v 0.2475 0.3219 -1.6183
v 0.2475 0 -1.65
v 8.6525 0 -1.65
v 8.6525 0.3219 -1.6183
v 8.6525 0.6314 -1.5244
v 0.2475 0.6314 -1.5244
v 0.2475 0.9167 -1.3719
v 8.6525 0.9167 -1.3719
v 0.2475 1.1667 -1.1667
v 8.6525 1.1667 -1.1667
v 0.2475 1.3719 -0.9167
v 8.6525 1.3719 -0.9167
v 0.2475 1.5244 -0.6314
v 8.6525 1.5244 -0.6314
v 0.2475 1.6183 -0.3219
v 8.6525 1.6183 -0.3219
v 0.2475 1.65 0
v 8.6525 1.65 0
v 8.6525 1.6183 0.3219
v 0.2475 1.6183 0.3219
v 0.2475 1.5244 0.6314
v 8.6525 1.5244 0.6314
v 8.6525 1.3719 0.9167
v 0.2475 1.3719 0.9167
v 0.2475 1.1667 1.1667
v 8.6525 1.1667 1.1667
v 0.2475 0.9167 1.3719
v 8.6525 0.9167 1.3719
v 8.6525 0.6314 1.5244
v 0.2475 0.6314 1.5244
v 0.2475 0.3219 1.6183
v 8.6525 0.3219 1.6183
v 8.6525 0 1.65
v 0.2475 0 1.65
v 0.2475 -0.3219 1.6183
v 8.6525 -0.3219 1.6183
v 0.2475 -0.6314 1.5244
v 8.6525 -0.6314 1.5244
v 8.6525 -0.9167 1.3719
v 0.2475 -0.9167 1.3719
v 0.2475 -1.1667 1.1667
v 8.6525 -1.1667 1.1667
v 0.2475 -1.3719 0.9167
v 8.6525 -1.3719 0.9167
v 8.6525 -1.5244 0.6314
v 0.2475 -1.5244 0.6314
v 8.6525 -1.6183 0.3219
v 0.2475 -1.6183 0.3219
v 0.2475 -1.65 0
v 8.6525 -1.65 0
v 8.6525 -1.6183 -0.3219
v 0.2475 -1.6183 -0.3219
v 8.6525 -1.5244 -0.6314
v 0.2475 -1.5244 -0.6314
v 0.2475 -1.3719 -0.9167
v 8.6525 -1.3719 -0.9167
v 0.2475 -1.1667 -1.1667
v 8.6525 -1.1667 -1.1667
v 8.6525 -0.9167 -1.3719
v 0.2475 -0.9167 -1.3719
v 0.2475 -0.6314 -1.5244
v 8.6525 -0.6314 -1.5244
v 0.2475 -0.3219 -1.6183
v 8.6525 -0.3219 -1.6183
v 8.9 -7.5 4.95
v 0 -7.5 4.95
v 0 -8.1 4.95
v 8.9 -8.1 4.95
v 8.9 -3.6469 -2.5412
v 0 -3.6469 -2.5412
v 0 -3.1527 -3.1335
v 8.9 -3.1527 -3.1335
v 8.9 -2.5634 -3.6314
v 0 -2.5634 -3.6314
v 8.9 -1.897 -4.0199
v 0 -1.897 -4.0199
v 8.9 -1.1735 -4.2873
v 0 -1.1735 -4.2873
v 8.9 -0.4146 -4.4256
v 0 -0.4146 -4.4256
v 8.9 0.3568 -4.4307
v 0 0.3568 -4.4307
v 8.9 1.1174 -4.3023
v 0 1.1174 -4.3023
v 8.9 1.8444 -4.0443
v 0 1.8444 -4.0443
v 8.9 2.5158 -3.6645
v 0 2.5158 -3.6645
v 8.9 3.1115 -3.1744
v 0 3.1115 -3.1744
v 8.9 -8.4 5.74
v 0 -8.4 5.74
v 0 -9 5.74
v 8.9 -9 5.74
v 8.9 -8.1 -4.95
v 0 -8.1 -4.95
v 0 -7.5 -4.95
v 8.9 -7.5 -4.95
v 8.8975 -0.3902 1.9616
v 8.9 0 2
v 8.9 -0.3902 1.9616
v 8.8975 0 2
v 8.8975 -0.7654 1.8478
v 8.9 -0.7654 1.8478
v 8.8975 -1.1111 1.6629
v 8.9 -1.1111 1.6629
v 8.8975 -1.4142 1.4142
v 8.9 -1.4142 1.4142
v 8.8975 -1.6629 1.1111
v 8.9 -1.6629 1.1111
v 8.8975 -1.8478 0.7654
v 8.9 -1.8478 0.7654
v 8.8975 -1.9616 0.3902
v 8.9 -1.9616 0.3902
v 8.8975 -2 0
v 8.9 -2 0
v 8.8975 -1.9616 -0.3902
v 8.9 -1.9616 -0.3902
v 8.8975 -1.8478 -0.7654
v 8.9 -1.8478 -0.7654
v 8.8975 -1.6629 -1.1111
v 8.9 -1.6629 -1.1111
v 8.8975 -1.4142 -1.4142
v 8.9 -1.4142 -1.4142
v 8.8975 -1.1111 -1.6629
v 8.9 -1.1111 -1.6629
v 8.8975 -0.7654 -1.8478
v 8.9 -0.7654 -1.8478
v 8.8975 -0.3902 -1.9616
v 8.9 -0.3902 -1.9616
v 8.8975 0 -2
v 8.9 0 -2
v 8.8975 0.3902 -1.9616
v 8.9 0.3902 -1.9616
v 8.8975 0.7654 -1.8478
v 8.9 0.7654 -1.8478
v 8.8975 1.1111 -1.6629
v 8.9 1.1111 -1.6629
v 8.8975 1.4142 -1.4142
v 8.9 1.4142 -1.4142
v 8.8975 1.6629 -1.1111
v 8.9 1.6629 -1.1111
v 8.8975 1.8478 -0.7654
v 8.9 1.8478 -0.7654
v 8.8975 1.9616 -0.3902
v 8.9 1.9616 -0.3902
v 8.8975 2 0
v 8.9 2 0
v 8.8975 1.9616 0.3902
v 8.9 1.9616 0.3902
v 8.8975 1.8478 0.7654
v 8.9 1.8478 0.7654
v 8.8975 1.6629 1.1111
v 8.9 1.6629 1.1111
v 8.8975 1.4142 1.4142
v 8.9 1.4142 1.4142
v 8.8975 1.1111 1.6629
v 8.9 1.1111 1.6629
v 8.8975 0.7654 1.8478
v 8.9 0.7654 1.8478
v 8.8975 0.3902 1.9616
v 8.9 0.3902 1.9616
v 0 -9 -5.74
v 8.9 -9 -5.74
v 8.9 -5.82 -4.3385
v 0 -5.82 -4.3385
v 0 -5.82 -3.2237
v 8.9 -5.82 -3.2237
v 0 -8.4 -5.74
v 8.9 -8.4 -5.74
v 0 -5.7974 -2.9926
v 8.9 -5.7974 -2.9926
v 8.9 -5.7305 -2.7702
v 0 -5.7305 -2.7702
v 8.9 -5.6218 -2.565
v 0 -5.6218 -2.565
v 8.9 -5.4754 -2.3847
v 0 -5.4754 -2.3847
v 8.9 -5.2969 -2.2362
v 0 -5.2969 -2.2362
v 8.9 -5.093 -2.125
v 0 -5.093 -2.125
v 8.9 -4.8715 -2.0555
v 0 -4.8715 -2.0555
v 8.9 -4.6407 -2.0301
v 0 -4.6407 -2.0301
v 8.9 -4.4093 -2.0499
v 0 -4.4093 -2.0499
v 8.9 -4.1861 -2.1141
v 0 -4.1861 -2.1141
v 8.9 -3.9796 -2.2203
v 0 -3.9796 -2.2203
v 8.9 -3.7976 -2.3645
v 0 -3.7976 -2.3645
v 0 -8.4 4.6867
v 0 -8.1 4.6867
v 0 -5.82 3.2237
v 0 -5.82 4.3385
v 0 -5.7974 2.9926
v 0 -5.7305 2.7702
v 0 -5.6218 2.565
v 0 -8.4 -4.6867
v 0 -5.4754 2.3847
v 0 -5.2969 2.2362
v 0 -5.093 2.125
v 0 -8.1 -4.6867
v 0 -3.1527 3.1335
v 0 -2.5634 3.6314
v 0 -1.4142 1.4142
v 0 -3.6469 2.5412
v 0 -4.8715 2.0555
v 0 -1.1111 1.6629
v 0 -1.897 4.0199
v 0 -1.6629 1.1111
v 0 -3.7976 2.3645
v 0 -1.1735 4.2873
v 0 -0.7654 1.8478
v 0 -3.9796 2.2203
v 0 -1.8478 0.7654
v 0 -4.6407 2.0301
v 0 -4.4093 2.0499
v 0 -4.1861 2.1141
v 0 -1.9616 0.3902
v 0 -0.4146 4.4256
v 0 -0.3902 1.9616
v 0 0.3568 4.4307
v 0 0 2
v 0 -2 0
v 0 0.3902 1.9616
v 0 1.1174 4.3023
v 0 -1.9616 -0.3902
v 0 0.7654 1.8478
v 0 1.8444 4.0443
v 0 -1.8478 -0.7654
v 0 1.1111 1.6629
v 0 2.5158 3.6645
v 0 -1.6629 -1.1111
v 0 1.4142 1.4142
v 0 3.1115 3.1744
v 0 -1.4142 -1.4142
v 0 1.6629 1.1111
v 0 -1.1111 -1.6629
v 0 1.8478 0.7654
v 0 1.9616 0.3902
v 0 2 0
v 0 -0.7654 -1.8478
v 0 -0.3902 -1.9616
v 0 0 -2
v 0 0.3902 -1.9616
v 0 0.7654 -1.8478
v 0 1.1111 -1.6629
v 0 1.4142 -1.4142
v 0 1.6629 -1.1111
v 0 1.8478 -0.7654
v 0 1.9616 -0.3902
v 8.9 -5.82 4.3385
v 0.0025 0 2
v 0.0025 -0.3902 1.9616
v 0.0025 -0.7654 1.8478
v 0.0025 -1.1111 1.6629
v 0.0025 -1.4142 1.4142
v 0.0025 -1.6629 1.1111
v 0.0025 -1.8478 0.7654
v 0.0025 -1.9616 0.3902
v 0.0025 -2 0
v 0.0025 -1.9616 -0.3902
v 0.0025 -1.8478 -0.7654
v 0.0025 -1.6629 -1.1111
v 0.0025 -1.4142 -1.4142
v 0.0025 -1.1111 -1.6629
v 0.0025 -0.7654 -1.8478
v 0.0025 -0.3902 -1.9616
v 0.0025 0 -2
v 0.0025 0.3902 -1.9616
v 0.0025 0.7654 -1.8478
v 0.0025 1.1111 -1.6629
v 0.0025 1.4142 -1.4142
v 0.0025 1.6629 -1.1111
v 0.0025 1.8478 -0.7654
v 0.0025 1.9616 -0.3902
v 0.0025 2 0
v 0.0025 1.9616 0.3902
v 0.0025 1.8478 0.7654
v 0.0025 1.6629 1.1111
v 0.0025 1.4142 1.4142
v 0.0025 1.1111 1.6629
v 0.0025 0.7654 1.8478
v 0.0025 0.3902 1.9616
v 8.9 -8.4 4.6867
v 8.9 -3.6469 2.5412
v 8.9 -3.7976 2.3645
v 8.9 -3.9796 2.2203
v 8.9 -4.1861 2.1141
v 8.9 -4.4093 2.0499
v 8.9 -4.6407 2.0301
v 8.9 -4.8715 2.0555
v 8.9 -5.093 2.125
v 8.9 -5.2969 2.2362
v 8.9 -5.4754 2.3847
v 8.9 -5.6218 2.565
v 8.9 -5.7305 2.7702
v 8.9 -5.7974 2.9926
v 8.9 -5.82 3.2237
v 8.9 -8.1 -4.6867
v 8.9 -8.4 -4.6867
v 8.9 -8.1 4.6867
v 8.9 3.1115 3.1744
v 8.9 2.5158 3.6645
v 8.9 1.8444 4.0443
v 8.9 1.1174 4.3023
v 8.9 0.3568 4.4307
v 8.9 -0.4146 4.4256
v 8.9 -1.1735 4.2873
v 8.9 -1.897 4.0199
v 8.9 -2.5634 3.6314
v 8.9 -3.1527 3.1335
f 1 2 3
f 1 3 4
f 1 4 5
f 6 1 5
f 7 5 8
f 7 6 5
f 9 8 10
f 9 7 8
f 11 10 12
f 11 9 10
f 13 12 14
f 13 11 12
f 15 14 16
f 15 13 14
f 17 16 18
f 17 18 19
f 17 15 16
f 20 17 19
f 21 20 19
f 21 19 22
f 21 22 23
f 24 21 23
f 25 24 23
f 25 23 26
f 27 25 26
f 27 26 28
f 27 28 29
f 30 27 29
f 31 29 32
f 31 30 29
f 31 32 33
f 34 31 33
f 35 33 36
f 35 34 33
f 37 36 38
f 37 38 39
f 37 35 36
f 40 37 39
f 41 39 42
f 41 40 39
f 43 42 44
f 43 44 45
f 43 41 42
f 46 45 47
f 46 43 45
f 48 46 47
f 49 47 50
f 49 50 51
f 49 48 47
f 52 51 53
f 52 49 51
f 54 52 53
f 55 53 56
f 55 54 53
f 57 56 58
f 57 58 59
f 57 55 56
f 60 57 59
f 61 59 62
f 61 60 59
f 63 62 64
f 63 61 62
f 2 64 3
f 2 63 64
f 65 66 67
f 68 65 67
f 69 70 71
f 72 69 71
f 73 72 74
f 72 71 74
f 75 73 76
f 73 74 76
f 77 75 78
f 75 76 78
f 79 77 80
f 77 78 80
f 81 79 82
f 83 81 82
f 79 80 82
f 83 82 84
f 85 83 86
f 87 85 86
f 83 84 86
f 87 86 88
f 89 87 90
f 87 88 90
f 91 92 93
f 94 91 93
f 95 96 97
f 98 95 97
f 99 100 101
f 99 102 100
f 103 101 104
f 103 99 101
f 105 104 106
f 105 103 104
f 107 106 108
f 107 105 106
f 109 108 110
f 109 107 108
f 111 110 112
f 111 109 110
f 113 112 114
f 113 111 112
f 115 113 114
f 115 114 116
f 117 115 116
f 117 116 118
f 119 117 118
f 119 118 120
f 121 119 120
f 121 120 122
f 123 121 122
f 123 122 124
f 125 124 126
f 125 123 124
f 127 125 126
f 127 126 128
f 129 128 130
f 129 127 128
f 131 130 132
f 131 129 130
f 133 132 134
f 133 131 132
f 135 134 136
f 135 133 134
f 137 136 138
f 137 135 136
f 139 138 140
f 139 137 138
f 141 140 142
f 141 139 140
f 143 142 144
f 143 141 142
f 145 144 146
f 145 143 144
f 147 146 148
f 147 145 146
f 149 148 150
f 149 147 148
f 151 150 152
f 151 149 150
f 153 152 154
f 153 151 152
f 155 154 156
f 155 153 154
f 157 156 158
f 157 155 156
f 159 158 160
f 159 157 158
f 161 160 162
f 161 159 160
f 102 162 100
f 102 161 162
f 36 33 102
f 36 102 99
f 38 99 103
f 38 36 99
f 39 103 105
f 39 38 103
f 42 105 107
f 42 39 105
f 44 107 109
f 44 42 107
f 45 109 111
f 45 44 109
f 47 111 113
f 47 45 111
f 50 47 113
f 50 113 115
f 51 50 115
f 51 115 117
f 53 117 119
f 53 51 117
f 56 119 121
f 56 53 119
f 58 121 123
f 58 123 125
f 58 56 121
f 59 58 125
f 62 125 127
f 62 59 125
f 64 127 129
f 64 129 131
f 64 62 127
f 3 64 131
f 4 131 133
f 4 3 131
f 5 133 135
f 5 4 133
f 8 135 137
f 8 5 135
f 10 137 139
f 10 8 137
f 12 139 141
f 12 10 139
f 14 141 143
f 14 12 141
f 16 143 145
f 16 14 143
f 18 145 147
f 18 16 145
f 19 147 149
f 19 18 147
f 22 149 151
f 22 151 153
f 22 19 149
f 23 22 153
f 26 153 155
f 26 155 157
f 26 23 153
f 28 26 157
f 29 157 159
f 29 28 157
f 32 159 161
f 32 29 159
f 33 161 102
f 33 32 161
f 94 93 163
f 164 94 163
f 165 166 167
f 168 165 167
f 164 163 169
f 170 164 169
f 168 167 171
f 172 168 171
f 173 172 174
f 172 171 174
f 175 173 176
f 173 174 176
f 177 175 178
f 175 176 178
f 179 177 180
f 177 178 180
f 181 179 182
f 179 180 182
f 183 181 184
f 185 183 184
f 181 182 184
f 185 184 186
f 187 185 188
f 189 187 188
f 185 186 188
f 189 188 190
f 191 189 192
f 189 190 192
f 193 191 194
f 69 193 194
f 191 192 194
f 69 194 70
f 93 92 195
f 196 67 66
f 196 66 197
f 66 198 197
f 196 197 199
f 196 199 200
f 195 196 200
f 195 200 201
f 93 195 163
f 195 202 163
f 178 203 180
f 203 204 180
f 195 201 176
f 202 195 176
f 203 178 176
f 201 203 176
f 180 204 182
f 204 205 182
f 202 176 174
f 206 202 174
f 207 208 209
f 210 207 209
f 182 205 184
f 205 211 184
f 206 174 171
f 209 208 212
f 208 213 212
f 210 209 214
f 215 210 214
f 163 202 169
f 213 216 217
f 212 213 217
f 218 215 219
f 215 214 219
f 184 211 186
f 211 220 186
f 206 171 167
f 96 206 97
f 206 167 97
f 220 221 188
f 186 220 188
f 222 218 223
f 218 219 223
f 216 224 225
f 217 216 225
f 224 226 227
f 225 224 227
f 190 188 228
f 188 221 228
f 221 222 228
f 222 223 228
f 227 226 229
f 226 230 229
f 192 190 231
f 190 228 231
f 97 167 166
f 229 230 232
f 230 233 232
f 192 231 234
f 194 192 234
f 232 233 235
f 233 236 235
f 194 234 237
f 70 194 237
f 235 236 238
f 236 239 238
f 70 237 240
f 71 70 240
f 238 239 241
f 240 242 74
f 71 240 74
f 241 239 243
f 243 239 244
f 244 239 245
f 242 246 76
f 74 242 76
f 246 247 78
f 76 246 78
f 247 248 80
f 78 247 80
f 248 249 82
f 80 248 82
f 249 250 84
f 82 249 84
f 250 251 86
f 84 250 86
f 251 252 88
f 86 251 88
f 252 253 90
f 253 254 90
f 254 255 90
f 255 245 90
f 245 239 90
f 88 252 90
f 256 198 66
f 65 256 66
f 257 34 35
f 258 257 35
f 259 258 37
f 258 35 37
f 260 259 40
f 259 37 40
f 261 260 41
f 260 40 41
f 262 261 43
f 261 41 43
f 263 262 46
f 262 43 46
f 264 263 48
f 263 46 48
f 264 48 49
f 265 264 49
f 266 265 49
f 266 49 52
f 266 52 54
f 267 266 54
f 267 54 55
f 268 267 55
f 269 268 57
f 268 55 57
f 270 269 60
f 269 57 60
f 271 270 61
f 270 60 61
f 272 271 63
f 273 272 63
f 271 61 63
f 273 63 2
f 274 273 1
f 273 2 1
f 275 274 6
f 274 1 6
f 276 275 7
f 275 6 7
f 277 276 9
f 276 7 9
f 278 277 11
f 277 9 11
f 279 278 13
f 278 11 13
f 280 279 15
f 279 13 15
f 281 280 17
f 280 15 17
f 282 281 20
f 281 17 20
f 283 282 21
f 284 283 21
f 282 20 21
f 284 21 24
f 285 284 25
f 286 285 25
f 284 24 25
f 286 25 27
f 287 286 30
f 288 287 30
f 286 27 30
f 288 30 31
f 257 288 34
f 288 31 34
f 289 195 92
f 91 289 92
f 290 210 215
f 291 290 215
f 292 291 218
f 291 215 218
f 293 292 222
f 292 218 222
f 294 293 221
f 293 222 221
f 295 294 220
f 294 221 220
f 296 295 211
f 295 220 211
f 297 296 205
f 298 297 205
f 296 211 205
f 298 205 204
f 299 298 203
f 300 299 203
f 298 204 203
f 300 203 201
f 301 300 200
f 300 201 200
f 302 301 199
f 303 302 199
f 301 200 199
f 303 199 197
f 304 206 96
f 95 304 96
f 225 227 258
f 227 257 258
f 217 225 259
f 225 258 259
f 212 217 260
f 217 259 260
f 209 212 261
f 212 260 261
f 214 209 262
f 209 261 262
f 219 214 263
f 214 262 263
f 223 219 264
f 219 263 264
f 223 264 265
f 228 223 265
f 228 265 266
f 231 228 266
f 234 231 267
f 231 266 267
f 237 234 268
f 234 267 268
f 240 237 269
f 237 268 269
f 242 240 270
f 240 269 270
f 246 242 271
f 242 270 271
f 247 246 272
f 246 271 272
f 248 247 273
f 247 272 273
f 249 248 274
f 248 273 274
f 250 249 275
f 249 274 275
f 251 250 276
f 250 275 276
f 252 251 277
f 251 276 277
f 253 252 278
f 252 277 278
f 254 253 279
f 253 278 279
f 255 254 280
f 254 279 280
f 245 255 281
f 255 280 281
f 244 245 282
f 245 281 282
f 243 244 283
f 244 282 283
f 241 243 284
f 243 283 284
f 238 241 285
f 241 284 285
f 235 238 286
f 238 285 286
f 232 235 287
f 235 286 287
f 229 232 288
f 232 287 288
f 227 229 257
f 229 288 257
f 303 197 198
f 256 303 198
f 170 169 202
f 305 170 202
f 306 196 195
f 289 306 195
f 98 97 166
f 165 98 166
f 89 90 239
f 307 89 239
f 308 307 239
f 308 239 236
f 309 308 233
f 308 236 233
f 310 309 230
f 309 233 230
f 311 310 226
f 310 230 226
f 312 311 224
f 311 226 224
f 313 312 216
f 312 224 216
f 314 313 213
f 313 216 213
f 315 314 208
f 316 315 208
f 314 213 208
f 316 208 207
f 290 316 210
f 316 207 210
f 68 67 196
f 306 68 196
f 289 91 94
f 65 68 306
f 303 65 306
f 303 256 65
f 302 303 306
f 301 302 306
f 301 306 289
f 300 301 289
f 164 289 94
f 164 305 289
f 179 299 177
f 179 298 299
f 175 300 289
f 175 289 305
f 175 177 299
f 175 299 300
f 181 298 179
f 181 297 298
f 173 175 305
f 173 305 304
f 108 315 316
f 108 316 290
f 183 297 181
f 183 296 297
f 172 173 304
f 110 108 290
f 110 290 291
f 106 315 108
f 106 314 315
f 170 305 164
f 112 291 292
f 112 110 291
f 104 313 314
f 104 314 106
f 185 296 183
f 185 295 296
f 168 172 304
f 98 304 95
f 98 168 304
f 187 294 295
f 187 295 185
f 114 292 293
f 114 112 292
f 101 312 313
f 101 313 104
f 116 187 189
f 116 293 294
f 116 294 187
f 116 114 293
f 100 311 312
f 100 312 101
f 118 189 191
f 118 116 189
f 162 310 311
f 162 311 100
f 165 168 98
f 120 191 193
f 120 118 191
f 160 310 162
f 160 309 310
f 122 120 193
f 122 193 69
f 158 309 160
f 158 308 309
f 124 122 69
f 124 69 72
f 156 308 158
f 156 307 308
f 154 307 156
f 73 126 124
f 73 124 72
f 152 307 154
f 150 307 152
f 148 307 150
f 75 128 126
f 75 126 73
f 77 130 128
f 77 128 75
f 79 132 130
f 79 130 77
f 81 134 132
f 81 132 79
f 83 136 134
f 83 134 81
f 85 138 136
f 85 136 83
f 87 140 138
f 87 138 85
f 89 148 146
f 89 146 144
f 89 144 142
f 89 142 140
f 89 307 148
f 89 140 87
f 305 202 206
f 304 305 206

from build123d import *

# Parameters (mm, degrees)
BODYSKE_R    = 1.65
BODY_DEPTH   = 8.9
TOPCUTSKE_W  = 8.89
TOPCUTSKE_H  = 8.89
TOPCUT_DEPTH = 8.9


with BuildPart() as part:
    # BodySke → Body (new body)
    with BuildSketch(Plane(origin=(0, 0, 0), x_dir=(0, 0, -1), z_dir=(1, 0, 0))):
        with BuildLine():
            Line((-5.74, -9), (5.74, -9))
            Line((5.74, -9), (5.74, -8.4))
            Line((5.74, -8.4), (4.686666667, -8.4))
            Line((4.686666667, -8.4), (4.686666667, -8.1))
            Line((4.686666667, -8.1), (4.95, -8.1))
            Line((4.95, -8.1), (4.95, -7.5))
            Line((4.95, -7.5), (4.338530006, -5.82))
            Line((4.338530006, -5.82), (3.223696854, -5.82))
            ThreePointArc((3.223696854, -5.82), (2.08483996, -4.983958225), (2.54124896, -3.646927299))
            ThreePointArc((2.54124896, -3.646927299), (0, 4.445), (-2.54124896, -3.646927299))
            ThreePointArc((-2.54124896, -3.646927299), (-2.08483996, -4.983958225), (-3.223696854, -5.82))
            Line((-3.223696854, -5.82), (-4.338530006, -5.82))
            Line((-4.338530006, -5.82), (-4.95, -7.5))
            Line((-4.95, -7.5), (-4.95, -8.1))
            Line((-4.95, -8.1), (-4.686666667, -8.1))
            Line((-4.686666667, -8.1), (-4.686666667, -8.4))
            Line((-4.686666667, -8.4), (-5.74, -8.4))
            Line((-5.74, -8.4), (-5.74, -9))
        make_face()
        Circle(BODYSKE_R, mode=Mode.SUBTRACT)
    extrude(amount=BODY_DEPTH)

    # EndChamferSke → EndChamfer (revolve, cut)
    with BuildSketch(Plane.XY, mode=Mode.PRIVATE) as endchamfer_sk:
        Polygon((-0.254, 2), (0.00254, 2), (0.247521613, 1.65), (-0.254, 1.65), align=None)
        Polygon((9.154, 2), (8.89746, 2), (8.652478387, 1.65), (9.154, 1.65), align=None)
    revolve(endchamfer_sk.sketch.rotate(Axis((-5.105879624, 0, 0), (1, 0, 0)), 90), axis=Axis((-5.105879624, 0, 0), (1, 0, 0)), mode=Mode.SUBTRACT)

    # TopCutSke → TopCut (cut)
    with BuildSketch(Plane.ZY):
        with Locations((0, 7.5565)):
            Rectangle(TOPCUTSKE_W, TOPCUTSKE_H)
    extrude(amount=-TOPCUT_DEPTH, mode=Mode.SUBTRACT)


solid = part.part
